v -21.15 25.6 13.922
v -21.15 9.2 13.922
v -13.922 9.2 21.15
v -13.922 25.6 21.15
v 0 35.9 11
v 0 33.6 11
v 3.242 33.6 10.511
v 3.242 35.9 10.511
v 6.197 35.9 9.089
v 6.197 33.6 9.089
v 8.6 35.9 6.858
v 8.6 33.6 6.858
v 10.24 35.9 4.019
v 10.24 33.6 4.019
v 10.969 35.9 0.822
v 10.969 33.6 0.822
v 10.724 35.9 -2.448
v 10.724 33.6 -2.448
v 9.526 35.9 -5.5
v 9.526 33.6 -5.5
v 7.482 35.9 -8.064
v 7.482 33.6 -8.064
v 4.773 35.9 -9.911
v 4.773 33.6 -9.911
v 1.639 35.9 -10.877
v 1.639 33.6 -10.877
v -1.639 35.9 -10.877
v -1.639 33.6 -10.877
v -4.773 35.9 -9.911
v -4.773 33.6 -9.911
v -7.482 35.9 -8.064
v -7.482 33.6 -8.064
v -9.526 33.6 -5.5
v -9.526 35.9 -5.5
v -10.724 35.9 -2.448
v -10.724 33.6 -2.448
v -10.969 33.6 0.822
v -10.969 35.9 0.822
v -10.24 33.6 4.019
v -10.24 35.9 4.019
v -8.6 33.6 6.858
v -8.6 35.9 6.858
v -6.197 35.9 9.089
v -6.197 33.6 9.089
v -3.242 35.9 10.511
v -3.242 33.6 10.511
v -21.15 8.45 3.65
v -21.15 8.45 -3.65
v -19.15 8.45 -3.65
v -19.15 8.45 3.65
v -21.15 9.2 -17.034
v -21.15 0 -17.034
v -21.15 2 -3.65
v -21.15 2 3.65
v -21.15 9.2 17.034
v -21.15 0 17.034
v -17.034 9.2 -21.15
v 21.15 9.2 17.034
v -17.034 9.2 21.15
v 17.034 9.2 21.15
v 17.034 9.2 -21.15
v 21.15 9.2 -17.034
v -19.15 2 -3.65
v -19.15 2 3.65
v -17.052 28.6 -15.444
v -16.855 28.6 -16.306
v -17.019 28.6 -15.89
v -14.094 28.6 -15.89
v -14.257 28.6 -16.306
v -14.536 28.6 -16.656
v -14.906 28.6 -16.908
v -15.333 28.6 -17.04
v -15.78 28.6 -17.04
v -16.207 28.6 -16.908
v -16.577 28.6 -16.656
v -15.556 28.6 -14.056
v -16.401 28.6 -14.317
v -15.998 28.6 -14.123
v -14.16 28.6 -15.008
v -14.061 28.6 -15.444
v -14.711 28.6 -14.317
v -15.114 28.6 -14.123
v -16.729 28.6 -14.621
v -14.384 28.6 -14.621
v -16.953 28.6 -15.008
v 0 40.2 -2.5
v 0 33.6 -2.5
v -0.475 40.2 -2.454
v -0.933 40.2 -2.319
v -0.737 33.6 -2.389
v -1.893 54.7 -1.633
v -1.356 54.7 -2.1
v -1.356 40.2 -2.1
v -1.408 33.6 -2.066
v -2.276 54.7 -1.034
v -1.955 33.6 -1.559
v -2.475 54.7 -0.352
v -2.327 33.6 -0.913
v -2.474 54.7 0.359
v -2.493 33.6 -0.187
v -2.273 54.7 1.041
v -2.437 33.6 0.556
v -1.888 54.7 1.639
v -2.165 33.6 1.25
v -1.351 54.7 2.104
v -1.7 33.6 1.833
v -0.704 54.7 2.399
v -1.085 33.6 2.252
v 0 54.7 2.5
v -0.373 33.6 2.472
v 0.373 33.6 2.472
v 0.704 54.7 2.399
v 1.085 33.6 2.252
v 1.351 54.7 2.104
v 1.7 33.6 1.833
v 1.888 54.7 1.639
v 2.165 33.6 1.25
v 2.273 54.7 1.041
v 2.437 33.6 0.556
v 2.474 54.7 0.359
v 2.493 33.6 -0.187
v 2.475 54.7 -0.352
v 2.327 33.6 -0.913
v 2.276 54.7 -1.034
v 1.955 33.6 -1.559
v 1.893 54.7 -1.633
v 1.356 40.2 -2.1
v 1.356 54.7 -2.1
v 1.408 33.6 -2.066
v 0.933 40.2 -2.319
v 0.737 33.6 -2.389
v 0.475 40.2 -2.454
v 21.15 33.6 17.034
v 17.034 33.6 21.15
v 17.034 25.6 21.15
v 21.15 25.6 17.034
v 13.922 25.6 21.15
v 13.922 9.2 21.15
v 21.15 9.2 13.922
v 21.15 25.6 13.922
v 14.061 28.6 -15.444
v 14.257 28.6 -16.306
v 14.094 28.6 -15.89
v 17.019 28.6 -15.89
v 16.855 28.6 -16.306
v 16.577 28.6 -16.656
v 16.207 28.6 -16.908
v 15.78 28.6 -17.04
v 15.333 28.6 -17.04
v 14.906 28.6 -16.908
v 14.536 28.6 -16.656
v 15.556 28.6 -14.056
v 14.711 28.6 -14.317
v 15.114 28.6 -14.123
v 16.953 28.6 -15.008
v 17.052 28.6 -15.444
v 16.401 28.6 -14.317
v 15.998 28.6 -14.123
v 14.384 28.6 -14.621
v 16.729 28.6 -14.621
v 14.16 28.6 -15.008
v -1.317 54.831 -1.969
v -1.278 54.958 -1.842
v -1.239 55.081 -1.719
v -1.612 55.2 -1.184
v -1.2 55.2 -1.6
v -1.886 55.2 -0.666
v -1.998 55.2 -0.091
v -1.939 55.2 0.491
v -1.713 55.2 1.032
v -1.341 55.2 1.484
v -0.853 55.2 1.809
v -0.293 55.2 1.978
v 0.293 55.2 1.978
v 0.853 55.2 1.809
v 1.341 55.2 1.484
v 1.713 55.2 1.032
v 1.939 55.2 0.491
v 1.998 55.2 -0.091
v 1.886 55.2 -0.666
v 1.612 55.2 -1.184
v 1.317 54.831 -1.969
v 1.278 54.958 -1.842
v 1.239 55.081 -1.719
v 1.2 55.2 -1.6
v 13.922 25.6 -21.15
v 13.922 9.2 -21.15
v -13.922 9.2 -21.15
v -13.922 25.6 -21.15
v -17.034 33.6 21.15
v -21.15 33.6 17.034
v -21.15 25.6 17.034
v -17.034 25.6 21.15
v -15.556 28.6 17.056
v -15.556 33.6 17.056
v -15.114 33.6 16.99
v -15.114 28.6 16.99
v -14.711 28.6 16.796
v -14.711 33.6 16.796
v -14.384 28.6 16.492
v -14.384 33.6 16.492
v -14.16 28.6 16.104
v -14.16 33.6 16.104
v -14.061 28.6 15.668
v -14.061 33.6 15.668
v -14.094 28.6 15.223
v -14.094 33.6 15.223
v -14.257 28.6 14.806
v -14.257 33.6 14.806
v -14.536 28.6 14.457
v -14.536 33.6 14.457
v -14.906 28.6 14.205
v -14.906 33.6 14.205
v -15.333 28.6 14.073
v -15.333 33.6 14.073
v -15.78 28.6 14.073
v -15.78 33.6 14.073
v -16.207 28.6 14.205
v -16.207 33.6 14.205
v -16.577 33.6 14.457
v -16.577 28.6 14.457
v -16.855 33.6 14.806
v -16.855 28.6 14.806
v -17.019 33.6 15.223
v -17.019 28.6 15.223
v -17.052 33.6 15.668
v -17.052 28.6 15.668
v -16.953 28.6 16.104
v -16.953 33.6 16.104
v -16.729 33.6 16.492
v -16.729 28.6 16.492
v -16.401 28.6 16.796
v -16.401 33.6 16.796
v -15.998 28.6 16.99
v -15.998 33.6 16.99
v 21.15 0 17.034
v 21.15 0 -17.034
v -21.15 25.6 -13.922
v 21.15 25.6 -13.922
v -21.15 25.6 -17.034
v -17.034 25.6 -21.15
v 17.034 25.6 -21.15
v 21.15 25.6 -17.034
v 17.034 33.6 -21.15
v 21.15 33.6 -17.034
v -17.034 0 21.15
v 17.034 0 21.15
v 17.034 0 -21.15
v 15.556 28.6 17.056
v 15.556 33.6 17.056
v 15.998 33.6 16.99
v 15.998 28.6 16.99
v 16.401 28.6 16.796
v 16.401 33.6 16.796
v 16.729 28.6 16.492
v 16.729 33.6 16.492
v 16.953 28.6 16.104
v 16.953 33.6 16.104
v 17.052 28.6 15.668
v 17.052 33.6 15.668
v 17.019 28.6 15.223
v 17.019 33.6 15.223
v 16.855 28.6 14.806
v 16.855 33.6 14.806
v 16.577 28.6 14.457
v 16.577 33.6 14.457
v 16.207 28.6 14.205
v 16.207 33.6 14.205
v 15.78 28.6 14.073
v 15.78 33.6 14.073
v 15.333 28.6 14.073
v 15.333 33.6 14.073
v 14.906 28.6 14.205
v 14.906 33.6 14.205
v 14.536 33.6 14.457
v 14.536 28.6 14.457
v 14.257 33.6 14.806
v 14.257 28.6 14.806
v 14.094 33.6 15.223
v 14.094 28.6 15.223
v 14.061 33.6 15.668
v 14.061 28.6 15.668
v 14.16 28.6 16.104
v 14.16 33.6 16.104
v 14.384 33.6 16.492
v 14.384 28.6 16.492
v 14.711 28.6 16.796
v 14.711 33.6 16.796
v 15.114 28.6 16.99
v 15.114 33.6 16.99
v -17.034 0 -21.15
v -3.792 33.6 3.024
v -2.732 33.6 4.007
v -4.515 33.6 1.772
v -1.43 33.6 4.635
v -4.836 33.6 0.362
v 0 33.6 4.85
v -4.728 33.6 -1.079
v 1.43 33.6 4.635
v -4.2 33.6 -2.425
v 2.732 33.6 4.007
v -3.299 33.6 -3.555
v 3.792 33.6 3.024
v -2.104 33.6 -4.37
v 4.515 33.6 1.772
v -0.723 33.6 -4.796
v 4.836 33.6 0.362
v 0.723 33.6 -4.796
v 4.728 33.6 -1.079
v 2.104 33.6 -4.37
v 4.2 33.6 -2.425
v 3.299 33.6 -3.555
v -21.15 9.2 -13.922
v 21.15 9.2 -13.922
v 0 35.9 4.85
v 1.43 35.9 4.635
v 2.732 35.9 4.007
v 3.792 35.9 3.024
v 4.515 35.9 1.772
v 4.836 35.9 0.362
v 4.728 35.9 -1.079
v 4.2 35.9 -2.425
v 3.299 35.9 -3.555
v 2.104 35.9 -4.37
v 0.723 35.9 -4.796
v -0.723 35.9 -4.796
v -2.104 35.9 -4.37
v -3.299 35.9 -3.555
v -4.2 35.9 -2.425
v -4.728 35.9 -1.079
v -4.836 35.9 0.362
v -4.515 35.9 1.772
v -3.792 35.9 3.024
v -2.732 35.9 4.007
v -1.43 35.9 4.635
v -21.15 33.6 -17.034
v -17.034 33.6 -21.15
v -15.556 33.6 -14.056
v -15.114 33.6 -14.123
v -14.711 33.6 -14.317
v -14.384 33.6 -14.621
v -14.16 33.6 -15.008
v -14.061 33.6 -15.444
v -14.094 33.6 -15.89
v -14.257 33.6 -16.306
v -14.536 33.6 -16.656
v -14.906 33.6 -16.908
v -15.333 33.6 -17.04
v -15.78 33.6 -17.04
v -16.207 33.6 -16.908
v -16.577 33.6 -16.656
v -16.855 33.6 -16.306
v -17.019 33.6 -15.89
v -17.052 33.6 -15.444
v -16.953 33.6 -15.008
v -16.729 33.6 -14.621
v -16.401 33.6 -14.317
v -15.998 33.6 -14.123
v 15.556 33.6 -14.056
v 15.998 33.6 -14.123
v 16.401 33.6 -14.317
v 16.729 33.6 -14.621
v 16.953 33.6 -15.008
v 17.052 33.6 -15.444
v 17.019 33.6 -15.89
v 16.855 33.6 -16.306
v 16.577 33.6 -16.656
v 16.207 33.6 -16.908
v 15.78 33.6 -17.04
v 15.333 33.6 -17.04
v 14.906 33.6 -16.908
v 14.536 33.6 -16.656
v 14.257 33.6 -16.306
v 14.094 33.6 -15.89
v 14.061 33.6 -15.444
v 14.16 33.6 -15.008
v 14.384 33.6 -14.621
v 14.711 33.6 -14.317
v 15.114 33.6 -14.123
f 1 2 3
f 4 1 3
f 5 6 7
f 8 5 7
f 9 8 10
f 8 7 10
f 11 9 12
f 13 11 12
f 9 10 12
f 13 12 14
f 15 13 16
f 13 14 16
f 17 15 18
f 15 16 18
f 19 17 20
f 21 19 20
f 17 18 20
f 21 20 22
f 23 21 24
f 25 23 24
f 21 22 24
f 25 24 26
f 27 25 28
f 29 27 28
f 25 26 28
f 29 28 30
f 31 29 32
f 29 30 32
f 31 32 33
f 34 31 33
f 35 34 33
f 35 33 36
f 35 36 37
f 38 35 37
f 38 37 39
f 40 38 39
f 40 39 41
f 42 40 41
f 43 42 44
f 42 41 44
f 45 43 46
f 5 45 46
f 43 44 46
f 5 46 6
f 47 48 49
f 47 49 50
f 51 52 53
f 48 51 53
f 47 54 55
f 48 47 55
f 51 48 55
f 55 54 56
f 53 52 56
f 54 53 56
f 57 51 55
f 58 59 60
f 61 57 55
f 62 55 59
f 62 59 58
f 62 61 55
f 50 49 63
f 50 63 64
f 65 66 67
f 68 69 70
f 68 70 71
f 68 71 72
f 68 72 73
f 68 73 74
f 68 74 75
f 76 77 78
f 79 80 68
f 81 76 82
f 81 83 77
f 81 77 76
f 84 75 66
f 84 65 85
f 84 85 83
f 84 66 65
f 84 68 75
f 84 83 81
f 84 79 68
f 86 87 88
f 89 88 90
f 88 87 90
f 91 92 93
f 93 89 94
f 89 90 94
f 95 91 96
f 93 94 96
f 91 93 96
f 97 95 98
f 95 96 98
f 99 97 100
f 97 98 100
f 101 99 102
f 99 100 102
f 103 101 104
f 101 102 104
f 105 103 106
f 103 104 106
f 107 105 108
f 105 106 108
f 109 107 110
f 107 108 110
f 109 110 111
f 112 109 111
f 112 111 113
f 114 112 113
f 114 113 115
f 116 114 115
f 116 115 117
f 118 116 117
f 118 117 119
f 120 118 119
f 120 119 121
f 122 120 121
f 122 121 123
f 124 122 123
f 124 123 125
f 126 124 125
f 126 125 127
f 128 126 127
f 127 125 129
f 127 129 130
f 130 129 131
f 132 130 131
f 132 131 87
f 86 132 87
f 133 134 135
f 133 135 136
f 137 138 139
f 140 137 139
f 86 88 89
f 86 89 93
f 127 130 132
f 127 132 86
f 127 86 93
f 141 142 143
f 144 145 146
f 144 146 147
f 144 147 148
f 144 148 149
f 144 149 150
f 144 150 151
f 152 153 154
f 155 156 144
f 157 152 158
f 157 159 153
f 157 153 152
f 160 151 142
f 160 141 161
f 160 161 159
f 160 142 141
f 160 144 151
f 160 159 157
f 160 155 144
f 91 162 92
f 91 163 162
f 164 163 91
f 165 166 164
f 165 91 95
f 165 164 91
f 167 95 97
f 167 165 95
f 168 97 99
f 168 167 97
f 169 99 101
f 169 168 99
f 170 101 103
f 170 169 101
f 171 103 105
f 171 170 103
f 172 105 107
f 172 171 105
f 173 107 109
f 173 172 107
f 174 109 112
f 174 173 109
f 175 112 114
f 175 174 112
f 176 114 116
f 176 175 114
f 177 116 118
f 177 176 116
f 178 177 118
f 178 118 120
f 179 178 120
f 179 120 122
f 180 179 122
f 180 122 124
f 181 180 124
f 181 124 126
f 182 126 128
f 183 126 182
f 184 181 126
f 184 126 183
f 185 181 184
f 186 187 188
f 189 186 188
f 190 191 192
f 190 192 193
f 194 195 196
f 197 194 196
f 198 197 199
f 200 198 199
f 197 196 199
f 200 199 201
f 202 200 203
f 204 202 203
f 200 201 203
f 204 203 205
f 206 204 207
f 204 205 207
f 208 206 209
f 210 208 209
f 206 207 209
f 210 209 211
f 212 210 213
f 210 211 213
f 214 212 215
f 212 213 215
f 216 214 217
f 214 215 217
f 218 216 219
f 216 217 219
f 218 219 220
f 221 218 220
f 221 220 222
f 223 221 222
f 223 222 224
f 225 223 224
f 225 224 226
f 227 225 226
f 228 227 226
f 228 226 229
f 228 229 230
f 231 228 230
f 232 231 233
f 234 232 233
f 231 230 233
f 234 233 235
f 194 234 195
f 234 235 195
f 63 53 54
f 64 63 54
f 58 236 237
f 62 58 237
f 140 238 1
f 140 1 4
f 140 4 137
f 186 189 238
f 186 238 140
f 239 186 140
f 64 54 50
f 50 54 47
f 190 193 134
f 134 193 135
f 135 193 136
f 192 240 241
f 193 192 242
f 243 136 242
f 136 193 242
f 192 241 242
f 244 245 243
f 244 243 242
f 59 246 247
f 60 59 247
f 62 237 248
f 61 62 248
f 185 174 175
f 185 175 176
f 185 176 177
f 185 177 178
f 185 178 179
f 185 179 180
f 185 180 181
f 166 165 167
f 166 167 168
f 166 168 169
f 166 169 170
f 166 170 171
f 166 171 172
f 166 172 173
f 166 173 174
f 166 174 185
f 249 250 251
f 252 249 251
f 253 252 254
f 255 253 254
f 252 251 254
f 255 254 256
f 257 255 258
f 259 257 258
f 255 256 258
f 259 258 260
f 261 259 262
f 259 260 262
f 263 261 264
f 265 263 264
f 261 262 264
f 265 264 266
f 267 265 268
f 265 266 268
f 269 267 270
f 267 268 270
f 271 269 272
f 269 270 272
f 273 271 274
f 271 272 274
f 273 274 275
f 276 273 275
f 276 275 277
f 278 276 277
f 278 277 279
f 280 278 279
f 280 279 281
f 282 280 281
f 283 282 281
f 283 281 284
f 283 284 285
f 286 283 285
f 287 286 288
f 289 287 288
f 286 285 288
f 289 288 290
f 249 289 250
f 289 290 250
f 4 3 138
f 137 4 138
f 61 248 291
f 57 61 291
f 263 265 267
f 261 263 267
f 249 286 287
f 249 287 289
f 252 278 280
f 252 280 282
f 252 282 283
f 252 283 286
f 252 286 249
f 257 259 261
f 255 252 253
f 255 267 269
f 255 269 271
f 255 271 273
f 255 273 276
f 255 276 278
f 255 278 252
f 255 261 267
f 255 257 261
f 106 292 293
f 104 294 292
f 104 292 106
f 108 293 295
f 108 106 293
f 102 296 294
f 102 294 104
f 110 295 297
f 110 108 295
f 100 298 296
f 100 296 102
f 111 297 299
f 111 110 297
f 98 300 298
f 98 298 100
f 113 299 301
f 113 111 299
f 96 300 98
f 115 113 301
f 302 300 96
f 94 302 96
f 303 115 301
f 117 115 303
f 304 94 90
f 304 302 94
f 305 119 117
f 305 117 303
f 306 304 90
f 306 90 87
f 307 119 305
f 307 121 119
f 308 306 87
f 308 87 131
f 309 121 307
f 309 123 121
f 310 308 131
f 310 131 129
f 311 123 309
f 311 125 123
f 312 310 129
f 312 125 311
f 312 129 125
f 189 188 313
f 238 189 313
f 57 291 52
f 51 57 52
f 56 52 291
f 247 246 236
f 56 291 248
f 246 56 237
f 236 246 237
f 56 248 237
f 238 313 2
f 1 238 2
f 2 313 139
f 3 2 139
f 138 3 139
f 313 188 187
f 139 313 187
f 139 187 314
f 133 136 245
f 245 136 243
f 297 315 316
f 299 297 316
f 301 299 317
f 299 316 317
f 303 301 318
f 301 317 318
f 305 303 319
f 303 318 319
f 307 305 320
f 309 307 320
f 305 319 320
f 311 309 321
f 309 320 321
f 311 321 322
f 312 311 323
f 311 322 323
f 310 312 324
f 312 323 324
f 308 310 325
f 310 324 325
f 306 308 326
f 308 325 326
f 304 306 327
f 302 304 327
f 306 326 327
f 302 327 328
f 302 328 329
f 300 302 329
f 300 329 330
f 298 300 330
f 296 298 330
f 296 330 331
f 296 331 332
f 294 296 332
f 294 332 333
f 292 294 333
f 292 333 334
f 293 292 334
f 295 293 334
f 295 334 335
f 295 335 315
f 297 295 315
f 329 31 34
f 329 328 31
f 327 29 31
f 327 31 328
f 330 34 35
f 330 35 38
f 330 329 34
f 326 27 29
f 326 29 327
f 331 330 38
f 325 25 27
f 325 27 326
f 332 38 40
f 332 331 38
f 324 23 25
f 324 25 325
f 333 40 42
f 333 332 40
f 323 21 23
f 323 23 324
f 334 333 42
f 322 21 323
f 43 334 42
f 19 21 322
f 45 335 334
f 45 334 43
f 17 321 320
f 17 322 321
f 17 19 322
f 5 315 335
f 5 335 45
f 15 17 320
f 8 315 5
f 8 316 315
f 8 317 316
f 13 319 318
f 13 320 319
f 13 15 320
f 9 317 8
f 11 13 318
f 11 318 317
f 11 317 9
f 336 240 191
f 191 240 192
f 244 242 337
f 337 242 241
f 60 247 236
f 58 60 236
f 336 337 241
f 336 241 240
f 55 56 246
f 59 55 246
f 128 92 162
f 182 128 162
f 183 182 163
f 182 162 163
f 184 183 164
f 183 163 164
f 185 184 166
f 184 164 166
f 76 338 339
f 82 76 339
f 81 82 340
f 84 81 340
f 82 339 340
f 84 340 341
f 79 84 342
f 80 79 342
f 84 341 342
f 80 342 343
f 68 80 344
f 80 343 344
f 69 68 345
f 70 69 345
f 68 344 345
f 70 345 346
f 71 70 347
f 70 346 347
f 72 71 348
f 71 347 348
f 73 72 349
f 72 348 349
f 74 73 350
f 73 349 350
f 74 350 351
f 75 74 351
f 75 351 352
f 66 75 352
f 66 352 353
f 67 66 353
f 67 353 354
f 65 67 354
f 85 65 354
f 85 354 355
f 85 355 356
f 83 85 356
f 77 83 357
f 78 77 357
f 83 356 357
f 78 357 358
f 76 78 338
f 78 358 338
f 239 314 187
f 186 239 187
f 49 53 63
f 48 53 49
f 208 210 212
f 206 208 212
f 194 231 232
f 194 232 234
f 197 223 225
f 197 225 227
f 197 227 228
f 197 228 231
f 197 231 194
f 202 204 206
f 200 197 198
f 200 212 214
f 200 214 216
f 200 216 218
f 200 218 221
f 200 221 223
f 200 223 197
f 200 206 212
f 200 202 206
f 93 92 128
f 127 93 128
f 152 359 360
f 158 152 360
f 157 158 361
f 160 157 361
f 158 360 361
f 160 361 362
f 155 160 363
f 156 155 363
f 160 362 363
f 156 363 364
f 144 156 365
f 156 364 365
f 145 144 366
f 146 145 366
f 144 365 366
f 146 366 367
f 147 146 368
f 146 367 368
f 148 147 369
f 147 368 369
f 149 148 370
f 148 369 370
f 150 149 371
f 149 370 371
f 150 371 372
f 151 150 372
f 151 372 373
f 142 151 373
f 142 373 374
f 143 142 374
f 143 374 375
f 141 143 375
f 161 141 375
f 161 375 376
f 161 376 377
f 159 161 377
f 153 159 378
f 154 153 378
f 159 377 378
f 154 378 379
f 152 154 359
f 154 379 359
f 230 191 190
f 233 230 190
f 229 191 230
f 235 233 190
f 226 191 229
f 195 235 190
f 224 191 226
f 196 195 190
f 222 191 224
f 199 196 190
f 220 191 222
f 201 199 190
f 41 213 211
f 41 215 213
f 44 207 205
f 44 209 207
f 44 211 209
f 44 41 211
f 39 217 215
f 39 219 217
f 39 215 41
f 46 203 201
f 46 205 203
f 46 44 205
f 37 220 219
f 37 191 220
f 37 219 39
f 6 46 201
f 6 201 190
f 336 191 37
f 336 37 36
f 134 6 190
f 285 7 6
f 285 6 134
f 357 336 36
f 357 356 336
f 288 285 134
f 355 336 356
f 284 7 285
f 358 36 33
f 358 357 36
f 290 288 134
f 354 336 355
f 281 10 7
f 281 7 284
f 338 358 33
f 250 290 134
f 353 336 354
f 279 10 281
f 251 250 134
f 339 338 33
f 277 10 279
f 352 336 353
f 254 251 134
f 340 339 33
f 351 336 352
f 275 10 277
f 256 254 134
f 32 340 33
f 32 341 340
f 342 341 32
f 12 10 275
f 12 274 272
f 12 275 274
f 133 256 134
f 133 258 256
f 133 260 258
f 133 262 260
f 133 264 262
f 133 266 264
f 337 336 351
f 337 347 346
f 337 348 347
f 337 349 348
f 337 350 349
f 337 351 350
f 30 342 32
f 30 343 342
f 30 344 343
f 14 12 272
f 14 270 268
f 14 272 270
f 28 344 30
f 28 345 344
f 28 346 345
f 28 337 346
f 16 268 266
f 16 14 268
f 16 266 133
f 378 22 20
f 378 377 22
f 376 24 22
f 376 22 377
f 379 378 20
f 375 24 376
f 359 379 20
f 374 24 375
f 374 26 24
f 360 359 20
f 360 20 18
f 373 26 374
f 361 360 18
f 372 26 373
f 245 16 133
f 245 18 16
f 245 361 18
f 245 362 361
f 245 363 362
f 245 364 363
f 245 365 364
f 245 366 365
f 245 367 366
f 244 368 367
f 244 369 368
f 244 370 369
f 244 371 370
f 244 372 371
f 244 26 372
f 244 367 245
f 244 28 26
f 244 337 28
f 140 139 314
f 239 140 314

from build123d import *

# Parameters (mm, degrees)
BOTTOMBASE_DEPTH            = 9.2
MIDDLEBASE_DEPTH            = 16.4
TOPBASE_DEPTH               = 8
SKETCH4_R                   = 1.5
MOUNTINGHOLES_DEPTH         = 5
SKETCH5_R                   = 11
RINGAROUNDAXEL_DEPTH        = 2.3
SKETCH6_R                   = 4.85
INNERCUTOUTAROUNDAXEL_DEPTH = 3.6
SKETCH9_W                   = 7.3
SKETCH9_H                   = 6.45
WIRES_2_DEPTH               = 2
SKETCH10_R                  = 2.5
AXEL_DEPTH                  = 21.6
FLATFACEOFAXEL_DEPTH        = 15
CHAMFER1_SIZE               = 0.5


with BuildPart() as part:
    # Sketch1 → BottomBase (new body)
    with BuildSketch(Plane(origin=(0, 0, 0), x_dir=(1, 0, 0), z_dir=(0, 1, 0))):
        Polygon((-17.033766184, 21.15), (-21.15, 17.033766184), (-21.15, -17.033766184), (-17.033766184, -21.15), (17.033766184, -21.15), (21.15, -17.033766184), (21.15, 17.033766184), (17.033766184, 21.15), align=None)
    extrude(amount=BOTTOMBASE_DEPTH)

    # Sketch9 → Wires 2 (cut)
    with BuildSketch(Plane.ZY.offset(21.15)):
        with Locations((0, 5.225)):
            Rectangle(SKETCH9_W, SKETCH9_H)
    extrude(amount=-WIRES_2_DEPTH, mode=Mode.SUBTRACT)


with BuildPart() as body_2:
    # Sketch2 → MiddleBase (new body)
    with BuildSketch(Plane(origin=(0, 9.2, 0), x_dir=(1, 0, 0), z_dir=(0, 1, 0))):
        Polygon((13.922496347, -21.15), (21.15, -13.922496347), (21.15, 13.922496347), (13.922496347, 21.15), (-13.922496347, 21.15), (-21.15, 13.922496347), (-21.15, -13.922496347), (-13.922496347, -21.15), align=None)
    extrude(amount=MIDDLEBASE_DEPTH)


with BuildPart() as body_3:
    # Sketch3 → TopBase (new body)
    with BuildSketch(Plane(origin=(0, 25.6, 0), x_dir=(1, 0, 0), z_dir=(0, 1, 0))):
        Polygon((21.15, 17.033766184), (17.033766184, 21.15), (-17.033766184, 21.15), (-21.15, 17.033766184), (-21.15, -17.033766184), (-17.033766184, -21.15), (17.033766184, -21.15), (21.15, -17.033766184), align=None)
    extrude(amount=TOPBASE_DEPTH)

    # Sketch4 → MountingHoles (cut)
    with BuildSketch(Plane(origin=(0, 33.6, 0), x_dir=(1, 0, 0), z_dir=(0, 1, 0))):
        with Locations(Location((15.556349186, 15.556349186, 0), (0, 0, 270))):
            Circle(SKETCH4_R)
        with Locations(Location((15.556349186, -15.556349186, 0), (0, 0, 270))):
            Circle(SKETCH4_R)
        with Locations(Location((-15.556349186, -15.556349186, 0), (0, 0, 270))):
            Circle(SKETCH4_R)
        with Locations(Location((-15.556349186, 15.556349186, 0), (0, 0, 270))):
            Circle(SKETCH4_R)
    extrude(amount=-MOUNTINGHOLES_DEPTH, mode=Mode.SUBTRACT)



with BuildPart() as body_4:
    # Sketch5 → RingAroundAxel (new body)
    with BuildSketch(Plane(origin=(0, 33.6, 0), x_dir=(1, 0, 0), z_dir=(0, 1, 0))):
        with Locations(Location((0, 0, 0), (0, 0, 270))):
            Circle(SKETCH5_R)
    extrude(amount=RINGAROUNDAXEL_DEPTH)

    # Sketch6 → InnerCutoutAroundAxel (cut)
    with BuildSketch(Plane(origin=(0, 35.9, 0), x_dir=(1, 0, 0), z_dir=(0, 1, 0))):
        with Locations(Location((0, 0, 0), (0, 0, 270))):
            Circle(SKETCH6_R)
    extrude(amount=-INNERCUTOUTAROUNDAXEL_DEPTH, mode=Mode.SUBTRACT)


with BuildPart() as body_3_1:
    add(body_3.part)

    add(body_4.part)  # Axel merges body 4
    # Sketch10 → Axel (add)
    with BuildSketch(Plane(origin=(0, 33.6, 0), x_dir=(1, 0, 0), z_dir=(0, 1, 0))):
        with Locations(Location((0, 0, 0), (0, 0, 90))):
            Circle(SKETCH10_R)
    extrude(amount=AXEL_DEPTH)

    # Sketch11 → FlatFaceOfAxel (cut)
    with BuildSketch(Plane(origin=(0, 55.2, 0), x_dir=(1, 0, 0), z_dir=(0, 1, 0))):
        with BuildLine():
            Line((-1.356465997, 2.1), (1.356465997, 2.1))
            ThreePointArc((1.356465997, 2.1), (0, 2.5), (-1.356465997, 2.1))
        make_face()
    extrude(amount=-FLATFACEOFAXEL_DEPTH, mode=Mode.SUBTRACT)

    # Chamfer1
    # the kernel refuses this chamfer: 0.5 mm, written as the material it takes off along each edge
    with BuildSketch(Plane(origin=(0, 55.2, 0), x_dir=(-0.05693067670621247, 0, -0.9983781337999009), z_dir=(0.9983781337999009, 0, -0.05693067670621247))) as chamfer1_piece_1:
        Polygon((2.5, -CHAMFER1_SIZE), (2.5 - CHAMFER1_SIZE, 0), (2.5, 0), align=None)
    revolve(axis=Axis((0, 55.2, 0), (0, 1, 0)), revolution_arc=353.472695813, mode=Mode.SUBTRACT)
    with BuildSketch(Plane(origin=(-2.642307491, 55.2, -2.1), x_dir=(0, -0.9996219169112968, -0.027495876610586605), z_dir=(1, 0, 0))) as chamfer1_piece_2:
        Polygon((CHAMFER1_SIZE * 0.999621916911, -CHAMFER1_SIZE * 0.0274958766106), (-CHAMFER1_SIZE * 0.0274958766106, -CHAMFER1_SIZE * 0.999621916911), (0, 0), align=None)
    extrude(amount=5.284614981, mode=Mode.SUBTRACT)


solid = Compound([part.part, body_2.part, body_3_1.part])
